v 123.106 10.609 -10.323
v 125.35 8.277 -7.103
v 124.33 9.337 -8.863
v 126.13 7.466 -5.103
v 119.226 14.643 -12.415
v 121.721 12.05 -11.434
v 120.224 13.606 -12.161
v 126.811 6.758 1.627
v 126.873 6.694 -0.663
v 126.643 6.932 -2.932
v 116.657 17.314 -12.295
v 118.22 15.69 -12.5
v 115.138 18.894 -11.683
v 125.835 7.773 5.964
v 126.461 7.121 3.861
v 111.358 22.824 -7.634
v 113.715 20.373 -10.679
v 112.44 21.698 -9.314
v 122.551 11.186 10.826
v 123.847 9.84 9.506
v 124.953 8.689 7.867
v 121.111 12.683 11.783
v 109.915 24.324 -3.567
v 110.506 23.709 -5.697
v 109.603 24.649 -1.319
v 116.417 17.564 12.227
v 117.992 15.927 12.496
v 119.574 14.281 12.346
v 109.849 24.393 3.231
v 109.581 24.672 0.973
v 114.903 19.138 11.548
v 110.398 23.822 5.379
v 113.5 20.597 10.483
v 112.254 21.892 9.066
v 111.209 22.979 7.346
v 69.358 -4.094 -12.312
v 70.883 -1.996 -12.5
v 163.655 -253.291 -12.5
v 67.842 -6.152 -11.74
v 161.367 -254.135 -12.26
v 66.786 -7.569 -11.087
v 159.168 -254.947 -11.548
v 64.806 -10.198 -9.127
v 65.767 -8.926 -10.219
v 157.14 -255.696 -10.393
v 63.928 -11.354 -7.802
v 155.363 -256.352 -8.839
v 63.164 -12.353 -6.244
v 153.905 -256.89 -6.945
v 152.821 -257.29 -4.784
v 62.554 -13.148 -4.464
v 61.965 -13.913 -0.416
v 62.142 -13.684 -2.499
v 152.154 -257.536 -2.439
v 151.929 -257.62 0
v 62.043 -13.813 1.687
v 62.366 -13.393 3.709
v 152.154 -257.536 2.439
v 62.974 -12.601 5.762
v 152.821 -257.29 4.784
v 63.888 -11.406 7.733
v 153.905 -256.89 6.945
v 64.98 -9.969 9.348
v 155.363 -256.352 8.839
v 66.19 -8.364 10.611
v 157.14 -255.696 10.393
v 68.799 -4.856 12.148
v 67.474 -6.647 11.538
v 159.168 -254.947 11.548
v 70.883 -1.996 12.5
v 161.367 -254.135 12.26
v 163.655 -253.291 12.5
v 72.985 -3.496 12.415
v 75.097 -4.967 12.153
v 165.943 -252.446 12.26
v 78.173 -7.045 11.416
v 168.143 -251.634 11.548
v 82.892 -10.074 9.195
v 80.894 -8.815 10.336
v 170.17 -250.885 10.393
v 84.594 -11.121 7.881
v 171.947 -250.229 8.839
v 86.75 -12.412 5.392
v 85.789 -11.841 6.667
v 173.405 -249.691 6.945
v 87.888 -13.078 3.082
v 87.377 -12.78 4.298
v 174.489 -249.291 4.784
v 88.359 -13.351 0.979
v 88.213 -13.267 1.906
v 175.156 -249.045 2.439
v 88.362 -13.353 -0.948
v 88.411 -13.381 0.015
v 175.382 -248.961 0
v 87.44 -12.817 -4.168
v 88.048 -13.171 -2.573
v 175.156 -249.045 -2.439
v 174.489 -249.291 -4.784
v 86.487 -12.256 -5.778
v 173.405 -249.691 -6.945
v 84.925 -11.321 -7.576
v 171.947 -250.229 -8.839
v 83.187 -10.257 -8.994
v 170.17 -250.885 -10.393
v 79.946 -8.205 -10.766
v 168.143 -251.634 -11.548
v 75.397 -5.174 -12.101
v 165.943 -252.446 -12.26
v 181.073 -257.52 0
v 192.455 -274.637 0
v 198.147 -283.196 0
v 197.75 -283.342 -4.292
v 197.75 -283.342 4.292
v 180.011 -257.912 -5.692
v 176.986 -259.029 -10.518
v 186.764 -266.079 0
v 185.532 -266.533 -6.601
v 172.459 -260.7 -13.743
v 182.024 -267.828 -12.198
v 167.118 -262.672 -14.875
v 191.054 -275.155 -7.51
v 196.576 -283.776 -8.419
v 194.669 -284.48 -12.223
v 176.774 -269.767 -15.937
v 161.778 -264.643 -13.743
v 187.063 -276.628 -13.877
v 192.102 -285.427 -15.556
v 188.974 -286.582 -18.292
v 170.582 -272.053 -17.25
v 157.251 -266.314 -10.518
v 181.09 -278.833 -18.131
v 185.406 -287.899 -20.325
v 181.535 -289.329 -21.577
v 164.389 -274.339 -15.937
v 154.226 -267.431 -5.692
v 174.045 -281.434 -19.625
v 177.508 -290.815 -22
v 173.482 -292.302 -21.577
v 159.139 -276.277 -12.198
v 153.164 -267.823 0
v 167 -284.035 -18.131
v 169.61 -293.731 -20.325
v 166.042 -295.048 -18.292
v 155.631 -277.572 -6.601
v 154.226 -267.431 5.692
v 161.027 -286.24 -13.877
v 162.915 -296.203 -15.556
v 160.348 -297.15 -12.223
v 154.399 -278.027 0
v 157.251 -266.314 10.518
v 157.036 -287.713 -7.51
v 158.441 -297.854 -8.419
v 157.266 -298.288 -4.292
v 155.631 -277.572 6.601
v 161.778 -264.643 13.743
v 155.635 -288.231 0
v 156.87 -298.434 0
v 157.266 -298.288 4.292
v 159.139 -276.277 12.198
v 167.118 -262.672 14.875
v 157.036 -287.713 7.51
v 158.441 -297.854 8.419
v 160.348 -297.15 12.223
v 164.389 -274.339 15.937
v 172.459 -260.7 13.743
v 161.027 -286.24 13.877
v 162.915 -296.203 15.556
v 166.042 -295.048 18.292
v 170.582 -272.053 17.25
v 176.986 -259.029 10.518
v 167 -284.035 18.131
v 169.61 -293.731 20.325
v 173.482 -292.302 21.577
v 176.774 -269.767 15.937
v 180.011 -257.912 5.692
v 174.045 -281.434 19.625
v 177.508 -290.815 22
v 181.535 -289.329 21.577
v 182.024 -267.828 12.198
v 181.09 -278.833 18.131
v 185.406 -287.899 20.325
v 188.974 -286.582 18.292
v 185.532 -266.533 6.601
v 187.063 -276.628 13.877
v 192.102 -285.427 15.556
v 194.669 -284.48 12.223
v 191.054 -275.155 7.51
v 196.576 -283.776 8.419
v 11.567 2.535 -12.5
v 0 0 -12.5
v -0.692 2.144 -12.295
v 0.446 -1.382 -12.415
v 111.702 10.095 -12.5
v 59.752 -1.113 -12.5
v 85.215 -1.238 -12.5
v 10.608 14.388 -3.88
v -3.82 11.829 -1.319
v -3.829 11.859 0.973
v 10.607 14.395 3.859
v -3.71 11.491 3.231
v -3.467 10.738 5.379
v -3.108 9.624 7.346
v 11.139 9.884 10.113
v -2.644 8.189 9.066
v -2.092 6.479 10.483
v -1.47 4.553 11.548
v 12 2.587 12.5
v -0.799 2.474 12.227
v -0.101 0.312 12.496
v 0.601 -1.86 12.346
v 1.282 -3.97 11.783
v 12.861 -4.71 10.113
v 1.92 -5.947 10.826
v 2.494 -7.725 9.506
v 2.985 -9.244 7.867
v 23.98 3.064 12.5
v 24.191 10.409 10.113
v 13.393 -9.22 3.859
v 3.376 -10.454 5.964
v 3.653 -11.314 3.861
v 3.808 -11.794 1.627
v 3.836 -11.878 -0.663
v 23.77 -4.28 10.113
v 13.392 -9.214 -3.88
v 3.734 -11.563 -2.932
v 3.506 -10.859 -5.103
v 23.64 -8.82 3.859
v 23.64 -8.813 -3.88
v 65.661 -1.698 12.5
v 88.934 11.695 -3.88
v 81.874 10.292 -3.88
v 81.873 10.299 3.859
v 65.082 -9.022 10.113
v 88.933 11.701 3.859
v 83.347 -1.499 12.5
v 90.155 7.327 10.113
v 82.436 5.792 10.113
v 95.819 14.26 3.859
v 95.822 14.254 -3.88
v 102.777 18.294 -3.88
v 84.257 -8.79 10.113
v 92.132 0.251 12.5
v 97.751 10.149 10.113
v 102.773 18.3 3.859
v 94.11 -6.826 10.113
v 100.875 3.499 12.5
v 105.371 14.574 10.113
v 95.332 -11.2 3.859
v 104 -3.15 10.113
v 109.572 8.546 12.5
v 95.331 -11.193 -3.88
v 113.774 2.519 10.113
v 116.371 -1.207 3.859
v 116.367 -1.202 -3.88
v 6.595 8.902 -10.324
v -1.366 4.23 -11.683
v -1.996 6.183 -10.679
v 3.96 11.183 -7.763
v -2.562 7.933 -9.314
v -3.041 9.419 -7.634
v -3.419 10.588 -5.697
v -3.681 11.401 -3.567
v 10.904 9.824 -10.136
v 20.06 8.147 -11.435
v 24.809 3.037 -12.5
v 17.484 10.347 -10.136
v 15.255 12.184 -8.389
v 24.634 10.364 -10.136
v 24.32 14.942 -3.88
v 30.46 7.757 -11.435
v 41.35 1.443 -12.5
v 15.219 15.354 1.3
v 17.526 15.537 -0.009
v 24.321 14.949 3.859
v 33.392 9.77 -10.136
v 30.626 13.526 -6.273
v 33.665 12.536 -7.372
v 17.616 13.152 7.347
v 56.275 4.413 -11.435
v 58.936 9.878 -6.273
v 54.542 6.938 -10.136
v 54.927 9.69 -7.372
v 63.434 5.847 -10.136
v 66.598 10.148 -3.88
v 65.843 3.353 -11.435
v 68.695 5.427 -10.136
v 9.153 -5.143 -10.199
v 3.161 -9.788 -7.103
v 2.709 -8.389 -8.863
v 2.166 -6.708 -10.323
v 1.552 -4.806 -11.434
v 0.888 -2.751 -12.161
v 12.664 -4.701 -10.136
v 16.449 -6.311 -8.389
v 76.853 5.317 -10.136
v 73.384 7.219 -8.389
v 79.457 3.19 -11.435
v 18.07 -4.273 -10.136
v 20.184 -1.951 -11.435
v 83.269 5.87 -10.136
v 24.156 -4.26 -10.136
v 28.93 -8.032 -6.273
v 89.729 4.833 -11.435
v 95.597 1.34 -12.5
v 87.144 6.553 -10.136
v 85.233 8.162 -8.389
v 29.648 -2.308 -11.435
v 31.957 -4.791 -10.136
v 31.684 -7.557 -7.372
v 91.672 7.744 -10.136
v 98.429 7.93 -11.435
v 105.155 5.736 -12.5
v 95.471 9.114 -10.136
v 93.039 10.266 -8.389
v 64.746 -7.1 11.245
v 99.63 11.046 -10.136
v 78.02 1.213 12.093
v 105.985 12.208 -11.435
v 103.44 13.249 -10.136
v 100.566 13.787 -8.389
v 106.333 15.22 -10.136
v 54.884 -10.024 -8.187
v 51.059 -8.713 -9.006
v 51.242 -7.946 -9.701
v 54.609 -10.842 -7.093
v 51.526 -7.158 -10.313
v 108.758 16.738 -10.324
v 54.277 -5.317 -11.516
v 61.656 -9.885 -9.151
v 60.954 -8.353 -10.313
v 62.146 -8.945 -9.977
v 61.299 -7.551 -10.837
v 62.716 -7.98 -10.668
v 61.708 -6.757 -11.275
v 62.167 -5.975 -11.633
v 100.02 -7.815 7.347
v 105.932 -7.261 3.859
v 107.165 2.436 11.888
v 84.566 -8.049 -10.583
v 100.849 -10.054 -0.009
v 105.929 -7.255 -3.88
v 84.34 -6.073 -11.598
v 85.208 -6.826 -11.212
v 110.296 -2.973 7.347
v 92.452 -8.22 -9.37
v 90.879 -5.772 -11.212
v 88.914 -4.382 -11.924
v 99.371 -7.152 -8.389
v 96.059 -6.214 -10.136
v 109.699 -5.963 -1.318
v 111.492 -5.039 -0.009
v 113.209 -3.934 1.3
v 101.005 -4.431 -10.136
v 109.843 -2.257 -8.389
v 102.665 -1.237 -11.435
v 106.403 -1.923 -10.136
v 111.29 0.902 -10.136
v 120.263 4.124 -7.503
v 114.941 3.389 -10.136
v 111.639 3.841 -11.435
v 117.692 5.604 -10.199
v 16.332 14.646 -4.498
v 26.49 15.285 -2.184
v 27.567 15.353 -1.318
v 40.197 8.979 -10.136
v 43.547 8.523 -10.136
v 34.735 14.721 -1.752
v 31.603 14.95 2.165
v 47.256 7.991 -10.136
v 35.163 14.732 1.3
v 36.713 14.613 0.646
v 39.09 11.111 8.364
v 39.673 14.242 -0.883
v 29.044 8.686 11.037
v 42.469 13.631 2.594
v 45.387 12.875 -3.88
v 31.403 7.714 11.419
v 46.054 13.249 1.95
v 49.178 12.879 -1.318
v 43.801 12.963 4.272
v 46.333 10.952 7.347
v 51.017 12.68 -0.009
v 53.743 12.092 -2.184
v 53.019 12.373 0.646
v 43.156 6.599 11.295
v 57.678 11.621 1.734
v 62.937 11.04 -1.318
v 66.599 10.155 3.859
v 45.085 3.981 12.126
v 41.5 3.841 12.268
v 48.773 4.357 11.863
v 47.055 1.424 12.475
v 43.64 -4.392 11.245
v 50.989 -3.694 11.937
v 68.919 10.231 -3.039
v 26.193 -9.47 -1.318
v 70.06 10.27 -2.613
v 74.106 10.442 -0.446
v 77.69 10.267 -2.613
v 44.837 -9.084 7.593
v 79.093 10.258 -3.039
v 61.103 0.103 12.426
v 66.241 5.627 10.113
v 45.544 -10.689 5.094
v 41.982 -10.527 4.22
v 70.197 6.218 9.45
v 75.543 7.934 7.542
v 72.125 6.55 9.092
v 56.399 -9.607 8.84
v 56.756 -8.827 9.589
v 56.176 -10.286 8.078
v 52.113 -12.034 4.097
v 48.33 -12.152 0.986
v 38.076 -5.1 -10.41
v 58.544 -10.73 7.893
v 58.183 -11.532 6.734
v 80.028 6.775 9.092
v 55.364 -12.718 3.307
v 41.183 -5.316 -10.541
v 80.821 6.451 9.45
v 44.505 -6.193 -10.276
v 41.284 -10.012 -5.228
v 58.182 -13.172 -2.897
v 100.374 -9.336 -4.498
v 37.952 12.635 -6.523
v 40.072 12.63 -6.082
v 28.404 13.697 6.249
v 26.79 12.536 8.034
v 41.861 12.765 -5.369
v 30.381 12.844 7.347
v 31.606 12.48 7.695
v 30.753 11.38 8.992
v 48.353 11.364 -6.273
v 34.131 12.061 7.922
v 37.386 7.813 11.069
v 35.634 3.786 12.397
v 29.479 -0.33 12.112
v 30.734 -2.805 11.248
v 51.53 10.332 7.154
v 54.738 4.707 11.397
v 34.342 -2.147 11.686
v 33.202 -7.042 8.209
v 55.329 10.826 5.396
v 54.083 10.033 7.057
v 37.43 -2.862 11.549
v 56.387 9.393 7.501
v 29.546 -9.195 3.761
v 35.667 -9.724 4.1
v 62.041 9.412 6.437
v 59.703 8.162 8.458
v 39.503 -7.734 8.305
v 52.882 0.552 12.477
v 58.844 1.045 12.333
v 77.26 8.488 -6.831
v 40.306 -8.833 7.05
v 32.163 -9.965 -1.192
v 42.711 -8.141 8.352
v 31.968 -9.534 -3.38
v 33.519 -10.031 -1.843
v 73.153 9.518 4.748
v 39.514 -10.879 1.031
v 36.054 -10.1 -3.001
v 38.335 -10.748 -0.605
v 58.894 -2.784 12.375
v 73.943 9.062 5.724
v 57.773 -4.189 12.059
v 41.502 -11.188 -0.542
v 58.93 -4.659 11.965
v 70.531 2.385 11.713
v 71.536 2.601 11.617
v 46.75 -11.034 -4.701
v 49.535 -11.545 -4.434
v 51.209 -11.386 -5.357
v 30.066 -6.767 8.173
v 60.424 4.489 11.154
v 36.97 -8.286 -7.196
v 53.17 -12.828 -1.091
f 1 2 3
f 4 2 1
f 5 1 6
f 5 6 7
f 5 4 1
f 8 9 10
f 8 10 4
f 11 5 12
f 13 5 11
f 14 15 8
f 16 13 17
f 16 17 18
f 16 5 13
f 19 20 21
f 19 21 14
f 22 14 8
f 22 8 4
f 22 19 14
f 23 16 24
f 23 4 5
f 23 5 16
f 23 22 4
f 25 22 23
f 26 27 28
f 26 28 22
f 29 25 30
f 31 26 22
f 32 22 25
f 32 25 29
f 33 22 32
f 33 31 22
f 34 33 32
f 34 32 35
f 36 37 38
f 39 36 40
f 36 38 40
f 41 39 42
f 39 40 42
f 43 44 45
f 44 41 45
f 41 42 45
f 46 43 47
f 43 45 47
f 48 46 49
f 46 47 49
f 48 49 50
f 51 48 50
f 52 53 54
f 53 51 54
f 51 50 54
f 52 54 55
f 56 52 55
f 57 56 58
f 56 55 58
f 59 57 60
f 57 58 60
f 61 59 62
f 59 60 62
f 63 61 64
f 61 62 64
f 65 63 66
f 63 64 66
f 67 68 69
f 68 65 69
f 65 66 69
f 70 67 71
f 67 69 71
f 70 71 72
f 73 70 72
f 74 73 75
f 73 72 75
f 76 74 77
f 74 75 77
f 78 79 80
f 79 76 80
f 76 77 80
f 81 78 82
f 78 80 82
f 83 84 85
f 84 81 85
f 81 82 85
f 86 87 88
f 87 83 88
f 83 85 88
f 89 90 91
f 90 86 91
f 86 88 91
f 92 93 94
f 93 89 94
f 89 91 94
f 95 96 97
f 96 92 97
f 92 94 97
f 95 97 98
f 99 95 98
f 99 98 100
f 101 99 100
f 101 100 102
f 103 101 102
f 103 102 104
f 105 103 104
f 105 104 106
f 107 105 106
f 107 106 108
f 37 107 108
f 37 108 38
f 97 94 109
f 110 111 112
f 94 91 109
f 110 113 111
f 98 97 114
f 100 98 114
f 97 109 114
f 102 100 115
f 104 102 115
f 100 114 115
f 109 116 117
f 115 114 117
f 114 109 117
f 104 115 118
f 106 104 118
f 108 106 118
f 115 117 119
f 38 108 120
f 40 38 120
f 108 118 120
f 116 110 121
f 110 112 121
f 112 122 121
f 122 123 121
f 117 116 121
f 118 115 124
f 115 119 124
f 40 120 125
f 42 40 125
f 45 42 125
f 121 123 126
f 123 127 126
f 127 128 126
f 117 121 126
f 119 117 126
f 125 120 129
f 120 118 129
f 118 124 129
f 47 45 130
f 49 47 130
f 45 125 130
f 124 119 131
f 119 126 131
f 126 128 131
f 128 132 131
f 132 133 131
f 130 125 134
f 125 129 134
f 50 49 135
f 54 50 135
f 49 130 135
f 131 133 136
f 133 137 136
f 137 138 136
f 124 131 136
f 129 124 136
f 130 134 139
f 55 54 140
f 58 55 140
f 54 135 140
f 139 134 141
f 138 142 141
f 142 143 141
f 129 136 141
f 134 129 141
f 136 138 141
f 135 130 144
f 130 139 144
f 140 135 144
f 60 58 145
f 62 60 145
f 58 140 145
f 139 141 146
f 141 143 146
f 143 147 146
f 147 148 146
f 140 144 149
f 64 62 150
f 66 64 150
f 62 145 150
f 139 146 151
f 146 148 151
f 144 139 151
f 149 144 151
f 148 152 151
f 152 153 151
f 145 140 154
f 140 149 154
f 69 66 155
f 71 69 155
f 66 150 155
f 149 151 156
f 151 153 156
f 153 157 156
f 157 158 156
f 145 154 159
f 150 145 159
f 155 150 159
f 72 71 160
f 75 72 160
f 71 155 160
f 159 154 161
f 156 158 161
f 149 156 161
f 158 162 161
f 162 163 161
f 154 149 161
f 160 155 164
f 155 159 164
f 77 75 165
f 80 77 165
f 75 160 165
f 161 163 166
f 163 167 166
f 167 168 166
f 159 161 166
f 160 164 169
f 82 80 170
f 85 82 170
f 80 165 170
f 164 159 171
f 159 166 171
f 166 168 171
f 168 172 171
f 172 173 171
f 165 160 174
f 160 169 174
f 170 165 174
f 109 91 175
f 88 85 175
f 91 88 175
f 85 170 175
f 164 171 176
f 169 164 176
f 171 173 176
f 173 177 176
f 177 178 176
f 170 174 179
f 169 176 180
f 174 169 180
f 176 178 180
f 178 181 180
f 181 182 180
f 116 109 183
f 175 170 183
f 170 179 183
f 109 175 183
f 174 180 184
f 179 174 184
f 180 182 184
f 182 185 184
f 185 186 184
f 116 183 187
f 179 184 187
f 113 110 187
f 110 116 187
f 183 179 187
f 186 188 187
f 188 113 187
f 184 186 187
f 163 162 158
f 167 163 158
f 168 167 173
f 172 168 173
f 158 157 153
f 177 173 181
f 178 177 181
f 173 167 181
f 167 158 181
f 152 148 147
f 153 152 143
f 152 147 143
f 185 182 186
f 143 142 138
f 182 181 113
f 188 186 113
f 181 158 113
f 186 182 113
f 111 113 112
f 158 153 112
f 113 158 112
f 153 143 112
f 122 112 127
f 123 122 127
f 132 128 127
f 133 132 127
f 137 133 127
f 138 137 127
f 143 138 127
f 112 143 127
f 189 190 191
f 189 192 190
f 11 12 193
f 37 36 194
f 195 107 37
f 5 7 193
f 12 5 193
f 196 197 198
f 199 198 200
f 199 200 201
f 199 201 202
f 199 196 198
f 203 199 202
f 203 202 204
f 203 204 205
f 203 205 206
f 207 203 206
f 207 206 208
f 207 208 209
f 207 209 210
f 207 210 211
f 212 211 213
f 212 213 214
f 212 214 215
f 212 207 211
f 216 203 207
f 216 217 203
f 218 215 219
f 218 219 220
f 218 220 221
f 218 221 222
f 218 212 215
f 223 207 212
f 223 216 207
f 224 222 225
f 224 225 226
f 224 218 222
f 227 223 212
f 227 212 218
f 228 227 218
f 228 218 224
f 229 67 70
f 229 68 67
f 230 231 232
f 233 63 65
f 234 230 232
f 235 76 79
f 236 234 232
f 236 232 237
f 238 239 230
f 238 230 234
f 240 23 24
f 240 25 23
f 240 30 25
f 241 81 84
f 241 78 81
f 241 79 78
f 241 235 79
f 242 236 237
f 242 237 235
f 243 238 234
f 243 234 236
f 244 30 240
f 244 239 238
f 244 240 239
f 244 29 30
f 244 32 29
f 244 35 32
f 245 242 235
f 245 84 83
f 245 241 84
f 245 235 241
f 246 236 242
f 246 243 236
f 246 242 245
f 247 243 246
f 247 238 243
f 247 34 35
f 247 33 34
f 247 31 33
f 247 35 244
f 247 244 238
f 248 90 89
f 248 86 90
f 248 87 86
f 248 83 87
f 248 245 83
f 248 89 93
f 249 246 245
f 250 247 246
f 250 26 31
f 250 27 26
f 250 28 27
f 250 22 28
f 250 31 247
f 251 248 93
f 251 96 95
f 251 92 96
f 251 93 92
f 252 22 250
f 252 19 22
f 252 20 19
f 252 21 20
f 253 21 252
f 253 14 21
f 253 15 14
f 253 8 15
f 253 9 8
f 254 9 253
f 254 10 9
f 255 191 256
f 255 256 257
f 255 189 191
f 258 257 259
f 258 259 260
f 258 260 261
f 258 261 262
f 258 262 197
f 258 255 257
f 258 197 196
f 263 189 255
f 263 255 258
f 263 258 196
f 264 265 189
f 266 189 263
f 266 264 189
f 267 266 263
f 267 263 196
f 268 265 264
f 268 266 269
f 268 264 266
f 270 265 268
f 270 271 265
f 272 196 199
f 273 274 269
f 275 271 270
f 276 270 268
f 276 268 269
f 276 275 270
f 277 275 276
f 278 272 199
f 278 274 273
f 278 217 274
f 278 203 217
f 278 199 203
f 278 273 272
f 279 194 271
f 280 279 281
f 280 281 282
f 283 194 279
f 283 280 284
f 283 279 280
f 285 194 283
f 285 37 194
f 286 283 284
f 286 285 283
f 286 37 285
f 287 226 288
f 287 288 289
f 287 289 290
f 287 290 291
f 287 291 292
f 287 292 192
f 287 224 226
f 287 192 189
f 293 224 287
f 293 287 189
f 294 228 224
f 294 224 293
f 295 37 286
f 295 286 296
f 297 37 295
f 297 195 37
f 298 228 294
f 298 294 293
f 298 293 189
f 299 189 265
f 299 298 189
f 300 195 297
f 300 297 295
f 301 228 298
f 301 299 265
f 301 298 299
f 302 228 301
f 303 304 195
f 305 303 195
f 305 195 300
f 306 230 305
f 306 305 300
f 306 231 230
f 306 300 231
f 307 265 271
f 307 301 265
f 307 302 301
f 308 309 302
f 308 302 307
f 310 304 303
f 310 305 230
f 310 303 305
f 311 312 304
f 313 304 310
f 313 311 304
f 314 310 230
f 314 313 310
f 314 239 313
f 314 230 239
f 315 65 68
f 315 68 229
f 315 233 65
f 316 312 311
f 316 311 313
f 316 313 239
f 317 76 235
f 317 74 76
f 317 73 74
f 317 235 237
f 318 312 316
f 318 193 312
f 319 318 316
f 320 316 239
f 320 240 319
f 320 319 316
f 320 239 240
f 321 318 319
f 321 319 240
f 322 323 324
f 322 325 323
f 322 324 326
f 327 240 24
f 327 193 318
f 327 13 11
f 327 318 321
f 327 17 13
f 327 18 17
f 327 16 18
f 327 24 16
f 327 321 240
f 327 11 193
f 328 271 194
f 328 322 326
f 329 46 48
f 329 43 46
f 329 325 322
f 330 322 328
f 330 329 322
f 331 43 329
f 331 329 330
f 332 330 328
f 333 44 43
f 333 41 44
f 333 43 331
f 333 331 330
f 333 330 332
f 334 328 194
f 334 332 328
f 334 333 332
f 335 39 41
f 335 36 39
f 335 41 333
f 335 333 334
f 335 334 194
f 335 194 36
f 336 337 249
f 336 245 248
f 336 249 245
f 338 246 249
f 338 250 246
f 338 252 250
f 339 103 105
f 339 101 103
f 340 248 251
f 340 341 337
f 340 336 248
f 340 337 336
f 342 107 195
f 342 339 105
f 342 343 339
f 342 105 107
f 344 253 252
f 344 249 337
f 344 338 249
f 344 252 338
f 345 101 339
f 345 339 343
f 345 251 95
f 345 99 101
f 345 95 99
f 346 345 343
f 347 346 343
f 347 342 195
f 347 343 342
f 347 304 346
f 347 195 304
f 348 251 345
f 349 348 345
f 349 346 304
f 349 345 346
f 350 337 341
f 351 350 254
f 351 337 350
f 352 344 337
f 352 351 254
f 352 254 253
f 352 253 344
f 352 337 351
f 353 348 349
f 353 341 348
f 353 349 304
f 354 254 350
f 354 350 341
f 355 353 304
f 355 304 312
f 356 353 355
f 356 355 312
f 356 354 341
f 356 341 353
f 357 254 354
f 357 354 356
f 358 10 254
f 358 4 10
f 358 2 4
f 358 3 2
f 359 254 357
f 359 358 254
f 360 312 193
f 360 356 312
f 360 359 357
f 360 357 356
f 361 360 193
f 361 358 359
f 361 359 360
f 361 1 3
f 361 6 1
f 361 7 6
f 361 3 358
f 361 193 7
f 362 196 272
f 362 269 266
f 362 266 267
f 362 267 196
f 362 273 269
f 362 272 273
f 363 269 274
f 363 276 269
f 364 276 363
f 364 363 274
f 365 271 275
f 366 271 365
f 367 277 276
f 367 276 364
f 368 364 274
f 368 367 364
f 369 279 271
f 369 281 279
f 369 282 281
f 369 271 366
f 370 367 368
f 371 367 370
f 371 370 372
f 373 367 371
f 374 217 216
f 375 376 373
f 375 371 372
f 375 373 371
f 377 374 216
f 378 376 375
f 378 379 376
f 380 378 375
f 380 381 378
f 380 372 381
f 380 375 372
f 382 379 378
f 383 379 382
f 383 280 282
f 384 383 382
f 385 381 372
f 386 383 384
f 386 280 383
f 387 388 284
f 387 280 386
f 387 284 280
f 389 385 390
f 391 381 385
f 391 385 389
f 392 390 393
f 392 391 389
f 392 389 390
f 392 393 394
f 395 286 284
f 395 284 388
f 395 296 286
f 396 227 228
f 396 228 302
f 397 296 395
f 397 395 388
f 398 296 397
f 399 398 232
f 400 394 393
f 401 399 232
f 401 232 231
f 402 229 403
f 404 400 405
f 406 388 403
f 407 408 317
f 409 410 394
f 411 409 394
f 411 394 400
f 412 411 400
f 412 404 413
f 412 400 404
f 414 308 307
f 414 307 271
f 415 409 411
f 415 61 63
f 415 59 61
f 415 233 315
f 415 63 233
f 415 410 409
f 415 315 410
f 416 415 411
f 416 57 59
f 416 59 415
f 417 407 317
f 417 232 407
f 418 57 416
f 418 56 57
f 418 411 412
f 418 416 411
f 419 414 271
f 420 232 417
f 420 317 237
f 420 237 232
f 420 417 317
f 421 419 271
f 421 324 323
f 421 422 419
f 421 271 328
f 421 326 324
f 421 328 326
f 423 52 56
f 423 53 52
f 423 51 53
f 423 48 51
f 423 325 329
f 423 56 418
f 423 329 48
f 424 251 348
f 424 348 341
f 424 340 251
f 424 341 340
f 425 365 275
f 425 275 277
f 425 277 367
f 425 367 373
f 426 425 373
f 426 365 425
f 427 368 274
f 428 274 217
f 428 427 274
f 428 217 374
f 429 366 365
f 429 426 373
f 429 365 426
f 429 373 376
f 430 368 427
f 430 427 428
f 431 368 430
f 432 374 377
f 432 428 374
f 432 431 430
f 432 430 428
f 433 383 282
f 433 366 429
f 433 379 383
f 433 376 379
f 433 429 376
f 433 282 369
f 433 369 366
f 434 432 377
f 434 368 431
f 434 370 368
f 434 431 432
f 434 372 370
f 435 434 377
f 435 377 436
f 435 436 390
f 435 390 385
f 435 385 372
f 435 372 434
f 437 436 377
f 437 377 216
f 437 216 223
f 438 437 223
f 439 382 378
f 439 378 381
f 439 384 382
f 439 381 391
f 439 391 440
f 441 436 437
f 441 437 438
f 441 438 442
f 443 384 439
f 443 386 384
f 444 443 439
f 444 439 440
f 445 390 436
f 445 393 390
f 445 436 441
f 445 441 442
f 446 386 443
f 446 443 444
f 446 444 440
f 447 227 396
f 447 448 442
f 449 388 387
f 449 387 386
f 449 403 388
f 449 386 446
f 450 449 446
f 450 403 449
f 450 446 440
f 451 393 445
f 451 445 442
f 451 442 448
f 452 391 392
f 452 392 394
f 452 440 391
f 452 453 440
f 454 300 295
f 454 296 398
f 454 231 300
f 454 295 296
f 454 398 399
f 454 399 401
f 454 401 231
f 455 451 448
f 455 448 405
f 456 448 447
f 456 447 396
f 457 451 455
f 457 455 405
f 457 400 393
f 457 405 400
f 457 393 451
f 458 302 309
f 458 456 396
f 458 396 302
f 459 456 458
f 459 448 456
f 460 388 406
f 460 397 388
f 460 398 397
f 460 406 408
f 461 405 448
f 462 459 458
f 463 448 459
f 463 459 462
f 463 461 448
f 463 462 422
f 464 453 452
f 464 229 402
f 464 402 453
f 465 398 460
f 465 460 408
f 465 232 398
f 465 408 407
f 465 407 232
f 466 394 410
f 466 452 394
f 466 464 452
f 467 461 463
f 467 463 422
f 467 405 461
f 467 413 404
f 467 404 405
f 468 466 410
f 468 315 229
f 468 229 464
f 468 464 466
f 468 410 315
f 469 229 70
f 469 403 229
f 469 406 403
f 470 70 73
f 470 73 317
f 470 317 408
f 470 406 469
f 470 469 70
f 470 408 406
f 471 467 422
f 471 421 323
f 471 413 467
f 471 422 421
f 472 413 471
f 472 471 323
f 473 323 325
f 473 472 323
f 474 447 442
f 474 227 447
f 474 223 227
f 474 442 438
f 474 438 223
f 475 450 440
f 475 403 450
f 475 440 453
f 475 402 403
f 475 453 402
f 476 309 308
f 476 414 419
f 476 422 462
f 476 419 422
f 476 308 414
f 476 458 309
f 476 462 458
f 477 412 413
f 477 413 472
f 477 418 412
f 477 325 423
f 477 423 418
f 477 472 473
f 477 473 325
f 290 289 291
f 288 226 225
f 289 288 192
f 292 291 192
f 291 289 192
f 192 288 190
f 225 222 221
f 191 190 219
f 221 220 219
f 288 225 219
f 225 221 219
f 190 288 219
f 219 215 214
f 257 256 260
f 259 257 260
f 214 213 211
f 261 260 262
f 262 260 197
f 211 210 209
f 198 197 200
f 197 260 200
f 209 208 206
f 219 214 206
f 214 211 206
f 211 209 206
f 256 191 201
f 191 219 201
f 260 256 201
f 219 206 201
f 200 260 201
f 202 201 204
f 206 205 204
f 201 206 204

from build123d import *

# Parameters (mm, degrees)
CROQUIS8_R              = 12.5
SALIENTE_EXTRUIR1_REACH = 326.791
CROQUIS11_R             = 12.5


with BuildPart() as part:
    # Barrer2: sweep along a path in Croquis7
    with BuildLine() as barrer2_path:  # in the path sketch's own coordinates; laid on its plane below (add() does not lay a ready-made edge on the line's plane)
        add(Edge.make_bspline(
            [(0, 0), (40.063845147, 12.936685998), (79.927373916, -21.140368078), (118.219501425, 15.689998663)],
            knots=[0, 0, 0, 0, 1, 1, 1, 1], degree=3))
    # Croquis8 → Barrer2 (sweep)
    with BuildSketch(Plane(origin=(0, 0, 0), x_dir=(0, 0, -1), z_dir=(0.9516192950583919, 0.30727954255460815, 0))):
        Circle(CROQUIS8_R)
    sweep(path=Plane.XY * barrer2_path.line)

    # Croquis11 → Saliente-Extruir1 (add, up to next)
    with BuildSketch(Plane(origin=(163.655125908, -253.290566887, 0), x_dir=(0.9381132106931296, 0.34632875122205475, 0), z_dir=(-0.34632875122205475, 0.9381132106931296, 0)), mode=Mode.PRIVATE) as saliente_extruir1_sk1:
        with Locations(Location((0, 0, 0), (0, 0, 90))):
            Circle(CROQUIS11_R)
    saliente_extruir1_tool1 = extrude(saliente_extruir1_sk1.sketch, amount=SALIENTE_EXTRUIR1_REACH, mode=Mode.PRIVATE) - part.part
    add(saliente_extruir1_tool1.solids().sort_by_distance((163.655126, -253.290567, 0))[0])

    # Croquis12 → Revolución3 (revolve)
    with BuildSketch(Plane.XY):
        Polygon((163.655125908, -253.290566887), (175.381541042, -248.961457497), (198.146766592, -283.195862788), (177.508275957, -290.815095315), align=None)
    revolve(axis=Axis((177.508275957, -290.815095315, 0), (-0.34632875122205564, 0.9381132106931294, 0)))


solid = part.part
